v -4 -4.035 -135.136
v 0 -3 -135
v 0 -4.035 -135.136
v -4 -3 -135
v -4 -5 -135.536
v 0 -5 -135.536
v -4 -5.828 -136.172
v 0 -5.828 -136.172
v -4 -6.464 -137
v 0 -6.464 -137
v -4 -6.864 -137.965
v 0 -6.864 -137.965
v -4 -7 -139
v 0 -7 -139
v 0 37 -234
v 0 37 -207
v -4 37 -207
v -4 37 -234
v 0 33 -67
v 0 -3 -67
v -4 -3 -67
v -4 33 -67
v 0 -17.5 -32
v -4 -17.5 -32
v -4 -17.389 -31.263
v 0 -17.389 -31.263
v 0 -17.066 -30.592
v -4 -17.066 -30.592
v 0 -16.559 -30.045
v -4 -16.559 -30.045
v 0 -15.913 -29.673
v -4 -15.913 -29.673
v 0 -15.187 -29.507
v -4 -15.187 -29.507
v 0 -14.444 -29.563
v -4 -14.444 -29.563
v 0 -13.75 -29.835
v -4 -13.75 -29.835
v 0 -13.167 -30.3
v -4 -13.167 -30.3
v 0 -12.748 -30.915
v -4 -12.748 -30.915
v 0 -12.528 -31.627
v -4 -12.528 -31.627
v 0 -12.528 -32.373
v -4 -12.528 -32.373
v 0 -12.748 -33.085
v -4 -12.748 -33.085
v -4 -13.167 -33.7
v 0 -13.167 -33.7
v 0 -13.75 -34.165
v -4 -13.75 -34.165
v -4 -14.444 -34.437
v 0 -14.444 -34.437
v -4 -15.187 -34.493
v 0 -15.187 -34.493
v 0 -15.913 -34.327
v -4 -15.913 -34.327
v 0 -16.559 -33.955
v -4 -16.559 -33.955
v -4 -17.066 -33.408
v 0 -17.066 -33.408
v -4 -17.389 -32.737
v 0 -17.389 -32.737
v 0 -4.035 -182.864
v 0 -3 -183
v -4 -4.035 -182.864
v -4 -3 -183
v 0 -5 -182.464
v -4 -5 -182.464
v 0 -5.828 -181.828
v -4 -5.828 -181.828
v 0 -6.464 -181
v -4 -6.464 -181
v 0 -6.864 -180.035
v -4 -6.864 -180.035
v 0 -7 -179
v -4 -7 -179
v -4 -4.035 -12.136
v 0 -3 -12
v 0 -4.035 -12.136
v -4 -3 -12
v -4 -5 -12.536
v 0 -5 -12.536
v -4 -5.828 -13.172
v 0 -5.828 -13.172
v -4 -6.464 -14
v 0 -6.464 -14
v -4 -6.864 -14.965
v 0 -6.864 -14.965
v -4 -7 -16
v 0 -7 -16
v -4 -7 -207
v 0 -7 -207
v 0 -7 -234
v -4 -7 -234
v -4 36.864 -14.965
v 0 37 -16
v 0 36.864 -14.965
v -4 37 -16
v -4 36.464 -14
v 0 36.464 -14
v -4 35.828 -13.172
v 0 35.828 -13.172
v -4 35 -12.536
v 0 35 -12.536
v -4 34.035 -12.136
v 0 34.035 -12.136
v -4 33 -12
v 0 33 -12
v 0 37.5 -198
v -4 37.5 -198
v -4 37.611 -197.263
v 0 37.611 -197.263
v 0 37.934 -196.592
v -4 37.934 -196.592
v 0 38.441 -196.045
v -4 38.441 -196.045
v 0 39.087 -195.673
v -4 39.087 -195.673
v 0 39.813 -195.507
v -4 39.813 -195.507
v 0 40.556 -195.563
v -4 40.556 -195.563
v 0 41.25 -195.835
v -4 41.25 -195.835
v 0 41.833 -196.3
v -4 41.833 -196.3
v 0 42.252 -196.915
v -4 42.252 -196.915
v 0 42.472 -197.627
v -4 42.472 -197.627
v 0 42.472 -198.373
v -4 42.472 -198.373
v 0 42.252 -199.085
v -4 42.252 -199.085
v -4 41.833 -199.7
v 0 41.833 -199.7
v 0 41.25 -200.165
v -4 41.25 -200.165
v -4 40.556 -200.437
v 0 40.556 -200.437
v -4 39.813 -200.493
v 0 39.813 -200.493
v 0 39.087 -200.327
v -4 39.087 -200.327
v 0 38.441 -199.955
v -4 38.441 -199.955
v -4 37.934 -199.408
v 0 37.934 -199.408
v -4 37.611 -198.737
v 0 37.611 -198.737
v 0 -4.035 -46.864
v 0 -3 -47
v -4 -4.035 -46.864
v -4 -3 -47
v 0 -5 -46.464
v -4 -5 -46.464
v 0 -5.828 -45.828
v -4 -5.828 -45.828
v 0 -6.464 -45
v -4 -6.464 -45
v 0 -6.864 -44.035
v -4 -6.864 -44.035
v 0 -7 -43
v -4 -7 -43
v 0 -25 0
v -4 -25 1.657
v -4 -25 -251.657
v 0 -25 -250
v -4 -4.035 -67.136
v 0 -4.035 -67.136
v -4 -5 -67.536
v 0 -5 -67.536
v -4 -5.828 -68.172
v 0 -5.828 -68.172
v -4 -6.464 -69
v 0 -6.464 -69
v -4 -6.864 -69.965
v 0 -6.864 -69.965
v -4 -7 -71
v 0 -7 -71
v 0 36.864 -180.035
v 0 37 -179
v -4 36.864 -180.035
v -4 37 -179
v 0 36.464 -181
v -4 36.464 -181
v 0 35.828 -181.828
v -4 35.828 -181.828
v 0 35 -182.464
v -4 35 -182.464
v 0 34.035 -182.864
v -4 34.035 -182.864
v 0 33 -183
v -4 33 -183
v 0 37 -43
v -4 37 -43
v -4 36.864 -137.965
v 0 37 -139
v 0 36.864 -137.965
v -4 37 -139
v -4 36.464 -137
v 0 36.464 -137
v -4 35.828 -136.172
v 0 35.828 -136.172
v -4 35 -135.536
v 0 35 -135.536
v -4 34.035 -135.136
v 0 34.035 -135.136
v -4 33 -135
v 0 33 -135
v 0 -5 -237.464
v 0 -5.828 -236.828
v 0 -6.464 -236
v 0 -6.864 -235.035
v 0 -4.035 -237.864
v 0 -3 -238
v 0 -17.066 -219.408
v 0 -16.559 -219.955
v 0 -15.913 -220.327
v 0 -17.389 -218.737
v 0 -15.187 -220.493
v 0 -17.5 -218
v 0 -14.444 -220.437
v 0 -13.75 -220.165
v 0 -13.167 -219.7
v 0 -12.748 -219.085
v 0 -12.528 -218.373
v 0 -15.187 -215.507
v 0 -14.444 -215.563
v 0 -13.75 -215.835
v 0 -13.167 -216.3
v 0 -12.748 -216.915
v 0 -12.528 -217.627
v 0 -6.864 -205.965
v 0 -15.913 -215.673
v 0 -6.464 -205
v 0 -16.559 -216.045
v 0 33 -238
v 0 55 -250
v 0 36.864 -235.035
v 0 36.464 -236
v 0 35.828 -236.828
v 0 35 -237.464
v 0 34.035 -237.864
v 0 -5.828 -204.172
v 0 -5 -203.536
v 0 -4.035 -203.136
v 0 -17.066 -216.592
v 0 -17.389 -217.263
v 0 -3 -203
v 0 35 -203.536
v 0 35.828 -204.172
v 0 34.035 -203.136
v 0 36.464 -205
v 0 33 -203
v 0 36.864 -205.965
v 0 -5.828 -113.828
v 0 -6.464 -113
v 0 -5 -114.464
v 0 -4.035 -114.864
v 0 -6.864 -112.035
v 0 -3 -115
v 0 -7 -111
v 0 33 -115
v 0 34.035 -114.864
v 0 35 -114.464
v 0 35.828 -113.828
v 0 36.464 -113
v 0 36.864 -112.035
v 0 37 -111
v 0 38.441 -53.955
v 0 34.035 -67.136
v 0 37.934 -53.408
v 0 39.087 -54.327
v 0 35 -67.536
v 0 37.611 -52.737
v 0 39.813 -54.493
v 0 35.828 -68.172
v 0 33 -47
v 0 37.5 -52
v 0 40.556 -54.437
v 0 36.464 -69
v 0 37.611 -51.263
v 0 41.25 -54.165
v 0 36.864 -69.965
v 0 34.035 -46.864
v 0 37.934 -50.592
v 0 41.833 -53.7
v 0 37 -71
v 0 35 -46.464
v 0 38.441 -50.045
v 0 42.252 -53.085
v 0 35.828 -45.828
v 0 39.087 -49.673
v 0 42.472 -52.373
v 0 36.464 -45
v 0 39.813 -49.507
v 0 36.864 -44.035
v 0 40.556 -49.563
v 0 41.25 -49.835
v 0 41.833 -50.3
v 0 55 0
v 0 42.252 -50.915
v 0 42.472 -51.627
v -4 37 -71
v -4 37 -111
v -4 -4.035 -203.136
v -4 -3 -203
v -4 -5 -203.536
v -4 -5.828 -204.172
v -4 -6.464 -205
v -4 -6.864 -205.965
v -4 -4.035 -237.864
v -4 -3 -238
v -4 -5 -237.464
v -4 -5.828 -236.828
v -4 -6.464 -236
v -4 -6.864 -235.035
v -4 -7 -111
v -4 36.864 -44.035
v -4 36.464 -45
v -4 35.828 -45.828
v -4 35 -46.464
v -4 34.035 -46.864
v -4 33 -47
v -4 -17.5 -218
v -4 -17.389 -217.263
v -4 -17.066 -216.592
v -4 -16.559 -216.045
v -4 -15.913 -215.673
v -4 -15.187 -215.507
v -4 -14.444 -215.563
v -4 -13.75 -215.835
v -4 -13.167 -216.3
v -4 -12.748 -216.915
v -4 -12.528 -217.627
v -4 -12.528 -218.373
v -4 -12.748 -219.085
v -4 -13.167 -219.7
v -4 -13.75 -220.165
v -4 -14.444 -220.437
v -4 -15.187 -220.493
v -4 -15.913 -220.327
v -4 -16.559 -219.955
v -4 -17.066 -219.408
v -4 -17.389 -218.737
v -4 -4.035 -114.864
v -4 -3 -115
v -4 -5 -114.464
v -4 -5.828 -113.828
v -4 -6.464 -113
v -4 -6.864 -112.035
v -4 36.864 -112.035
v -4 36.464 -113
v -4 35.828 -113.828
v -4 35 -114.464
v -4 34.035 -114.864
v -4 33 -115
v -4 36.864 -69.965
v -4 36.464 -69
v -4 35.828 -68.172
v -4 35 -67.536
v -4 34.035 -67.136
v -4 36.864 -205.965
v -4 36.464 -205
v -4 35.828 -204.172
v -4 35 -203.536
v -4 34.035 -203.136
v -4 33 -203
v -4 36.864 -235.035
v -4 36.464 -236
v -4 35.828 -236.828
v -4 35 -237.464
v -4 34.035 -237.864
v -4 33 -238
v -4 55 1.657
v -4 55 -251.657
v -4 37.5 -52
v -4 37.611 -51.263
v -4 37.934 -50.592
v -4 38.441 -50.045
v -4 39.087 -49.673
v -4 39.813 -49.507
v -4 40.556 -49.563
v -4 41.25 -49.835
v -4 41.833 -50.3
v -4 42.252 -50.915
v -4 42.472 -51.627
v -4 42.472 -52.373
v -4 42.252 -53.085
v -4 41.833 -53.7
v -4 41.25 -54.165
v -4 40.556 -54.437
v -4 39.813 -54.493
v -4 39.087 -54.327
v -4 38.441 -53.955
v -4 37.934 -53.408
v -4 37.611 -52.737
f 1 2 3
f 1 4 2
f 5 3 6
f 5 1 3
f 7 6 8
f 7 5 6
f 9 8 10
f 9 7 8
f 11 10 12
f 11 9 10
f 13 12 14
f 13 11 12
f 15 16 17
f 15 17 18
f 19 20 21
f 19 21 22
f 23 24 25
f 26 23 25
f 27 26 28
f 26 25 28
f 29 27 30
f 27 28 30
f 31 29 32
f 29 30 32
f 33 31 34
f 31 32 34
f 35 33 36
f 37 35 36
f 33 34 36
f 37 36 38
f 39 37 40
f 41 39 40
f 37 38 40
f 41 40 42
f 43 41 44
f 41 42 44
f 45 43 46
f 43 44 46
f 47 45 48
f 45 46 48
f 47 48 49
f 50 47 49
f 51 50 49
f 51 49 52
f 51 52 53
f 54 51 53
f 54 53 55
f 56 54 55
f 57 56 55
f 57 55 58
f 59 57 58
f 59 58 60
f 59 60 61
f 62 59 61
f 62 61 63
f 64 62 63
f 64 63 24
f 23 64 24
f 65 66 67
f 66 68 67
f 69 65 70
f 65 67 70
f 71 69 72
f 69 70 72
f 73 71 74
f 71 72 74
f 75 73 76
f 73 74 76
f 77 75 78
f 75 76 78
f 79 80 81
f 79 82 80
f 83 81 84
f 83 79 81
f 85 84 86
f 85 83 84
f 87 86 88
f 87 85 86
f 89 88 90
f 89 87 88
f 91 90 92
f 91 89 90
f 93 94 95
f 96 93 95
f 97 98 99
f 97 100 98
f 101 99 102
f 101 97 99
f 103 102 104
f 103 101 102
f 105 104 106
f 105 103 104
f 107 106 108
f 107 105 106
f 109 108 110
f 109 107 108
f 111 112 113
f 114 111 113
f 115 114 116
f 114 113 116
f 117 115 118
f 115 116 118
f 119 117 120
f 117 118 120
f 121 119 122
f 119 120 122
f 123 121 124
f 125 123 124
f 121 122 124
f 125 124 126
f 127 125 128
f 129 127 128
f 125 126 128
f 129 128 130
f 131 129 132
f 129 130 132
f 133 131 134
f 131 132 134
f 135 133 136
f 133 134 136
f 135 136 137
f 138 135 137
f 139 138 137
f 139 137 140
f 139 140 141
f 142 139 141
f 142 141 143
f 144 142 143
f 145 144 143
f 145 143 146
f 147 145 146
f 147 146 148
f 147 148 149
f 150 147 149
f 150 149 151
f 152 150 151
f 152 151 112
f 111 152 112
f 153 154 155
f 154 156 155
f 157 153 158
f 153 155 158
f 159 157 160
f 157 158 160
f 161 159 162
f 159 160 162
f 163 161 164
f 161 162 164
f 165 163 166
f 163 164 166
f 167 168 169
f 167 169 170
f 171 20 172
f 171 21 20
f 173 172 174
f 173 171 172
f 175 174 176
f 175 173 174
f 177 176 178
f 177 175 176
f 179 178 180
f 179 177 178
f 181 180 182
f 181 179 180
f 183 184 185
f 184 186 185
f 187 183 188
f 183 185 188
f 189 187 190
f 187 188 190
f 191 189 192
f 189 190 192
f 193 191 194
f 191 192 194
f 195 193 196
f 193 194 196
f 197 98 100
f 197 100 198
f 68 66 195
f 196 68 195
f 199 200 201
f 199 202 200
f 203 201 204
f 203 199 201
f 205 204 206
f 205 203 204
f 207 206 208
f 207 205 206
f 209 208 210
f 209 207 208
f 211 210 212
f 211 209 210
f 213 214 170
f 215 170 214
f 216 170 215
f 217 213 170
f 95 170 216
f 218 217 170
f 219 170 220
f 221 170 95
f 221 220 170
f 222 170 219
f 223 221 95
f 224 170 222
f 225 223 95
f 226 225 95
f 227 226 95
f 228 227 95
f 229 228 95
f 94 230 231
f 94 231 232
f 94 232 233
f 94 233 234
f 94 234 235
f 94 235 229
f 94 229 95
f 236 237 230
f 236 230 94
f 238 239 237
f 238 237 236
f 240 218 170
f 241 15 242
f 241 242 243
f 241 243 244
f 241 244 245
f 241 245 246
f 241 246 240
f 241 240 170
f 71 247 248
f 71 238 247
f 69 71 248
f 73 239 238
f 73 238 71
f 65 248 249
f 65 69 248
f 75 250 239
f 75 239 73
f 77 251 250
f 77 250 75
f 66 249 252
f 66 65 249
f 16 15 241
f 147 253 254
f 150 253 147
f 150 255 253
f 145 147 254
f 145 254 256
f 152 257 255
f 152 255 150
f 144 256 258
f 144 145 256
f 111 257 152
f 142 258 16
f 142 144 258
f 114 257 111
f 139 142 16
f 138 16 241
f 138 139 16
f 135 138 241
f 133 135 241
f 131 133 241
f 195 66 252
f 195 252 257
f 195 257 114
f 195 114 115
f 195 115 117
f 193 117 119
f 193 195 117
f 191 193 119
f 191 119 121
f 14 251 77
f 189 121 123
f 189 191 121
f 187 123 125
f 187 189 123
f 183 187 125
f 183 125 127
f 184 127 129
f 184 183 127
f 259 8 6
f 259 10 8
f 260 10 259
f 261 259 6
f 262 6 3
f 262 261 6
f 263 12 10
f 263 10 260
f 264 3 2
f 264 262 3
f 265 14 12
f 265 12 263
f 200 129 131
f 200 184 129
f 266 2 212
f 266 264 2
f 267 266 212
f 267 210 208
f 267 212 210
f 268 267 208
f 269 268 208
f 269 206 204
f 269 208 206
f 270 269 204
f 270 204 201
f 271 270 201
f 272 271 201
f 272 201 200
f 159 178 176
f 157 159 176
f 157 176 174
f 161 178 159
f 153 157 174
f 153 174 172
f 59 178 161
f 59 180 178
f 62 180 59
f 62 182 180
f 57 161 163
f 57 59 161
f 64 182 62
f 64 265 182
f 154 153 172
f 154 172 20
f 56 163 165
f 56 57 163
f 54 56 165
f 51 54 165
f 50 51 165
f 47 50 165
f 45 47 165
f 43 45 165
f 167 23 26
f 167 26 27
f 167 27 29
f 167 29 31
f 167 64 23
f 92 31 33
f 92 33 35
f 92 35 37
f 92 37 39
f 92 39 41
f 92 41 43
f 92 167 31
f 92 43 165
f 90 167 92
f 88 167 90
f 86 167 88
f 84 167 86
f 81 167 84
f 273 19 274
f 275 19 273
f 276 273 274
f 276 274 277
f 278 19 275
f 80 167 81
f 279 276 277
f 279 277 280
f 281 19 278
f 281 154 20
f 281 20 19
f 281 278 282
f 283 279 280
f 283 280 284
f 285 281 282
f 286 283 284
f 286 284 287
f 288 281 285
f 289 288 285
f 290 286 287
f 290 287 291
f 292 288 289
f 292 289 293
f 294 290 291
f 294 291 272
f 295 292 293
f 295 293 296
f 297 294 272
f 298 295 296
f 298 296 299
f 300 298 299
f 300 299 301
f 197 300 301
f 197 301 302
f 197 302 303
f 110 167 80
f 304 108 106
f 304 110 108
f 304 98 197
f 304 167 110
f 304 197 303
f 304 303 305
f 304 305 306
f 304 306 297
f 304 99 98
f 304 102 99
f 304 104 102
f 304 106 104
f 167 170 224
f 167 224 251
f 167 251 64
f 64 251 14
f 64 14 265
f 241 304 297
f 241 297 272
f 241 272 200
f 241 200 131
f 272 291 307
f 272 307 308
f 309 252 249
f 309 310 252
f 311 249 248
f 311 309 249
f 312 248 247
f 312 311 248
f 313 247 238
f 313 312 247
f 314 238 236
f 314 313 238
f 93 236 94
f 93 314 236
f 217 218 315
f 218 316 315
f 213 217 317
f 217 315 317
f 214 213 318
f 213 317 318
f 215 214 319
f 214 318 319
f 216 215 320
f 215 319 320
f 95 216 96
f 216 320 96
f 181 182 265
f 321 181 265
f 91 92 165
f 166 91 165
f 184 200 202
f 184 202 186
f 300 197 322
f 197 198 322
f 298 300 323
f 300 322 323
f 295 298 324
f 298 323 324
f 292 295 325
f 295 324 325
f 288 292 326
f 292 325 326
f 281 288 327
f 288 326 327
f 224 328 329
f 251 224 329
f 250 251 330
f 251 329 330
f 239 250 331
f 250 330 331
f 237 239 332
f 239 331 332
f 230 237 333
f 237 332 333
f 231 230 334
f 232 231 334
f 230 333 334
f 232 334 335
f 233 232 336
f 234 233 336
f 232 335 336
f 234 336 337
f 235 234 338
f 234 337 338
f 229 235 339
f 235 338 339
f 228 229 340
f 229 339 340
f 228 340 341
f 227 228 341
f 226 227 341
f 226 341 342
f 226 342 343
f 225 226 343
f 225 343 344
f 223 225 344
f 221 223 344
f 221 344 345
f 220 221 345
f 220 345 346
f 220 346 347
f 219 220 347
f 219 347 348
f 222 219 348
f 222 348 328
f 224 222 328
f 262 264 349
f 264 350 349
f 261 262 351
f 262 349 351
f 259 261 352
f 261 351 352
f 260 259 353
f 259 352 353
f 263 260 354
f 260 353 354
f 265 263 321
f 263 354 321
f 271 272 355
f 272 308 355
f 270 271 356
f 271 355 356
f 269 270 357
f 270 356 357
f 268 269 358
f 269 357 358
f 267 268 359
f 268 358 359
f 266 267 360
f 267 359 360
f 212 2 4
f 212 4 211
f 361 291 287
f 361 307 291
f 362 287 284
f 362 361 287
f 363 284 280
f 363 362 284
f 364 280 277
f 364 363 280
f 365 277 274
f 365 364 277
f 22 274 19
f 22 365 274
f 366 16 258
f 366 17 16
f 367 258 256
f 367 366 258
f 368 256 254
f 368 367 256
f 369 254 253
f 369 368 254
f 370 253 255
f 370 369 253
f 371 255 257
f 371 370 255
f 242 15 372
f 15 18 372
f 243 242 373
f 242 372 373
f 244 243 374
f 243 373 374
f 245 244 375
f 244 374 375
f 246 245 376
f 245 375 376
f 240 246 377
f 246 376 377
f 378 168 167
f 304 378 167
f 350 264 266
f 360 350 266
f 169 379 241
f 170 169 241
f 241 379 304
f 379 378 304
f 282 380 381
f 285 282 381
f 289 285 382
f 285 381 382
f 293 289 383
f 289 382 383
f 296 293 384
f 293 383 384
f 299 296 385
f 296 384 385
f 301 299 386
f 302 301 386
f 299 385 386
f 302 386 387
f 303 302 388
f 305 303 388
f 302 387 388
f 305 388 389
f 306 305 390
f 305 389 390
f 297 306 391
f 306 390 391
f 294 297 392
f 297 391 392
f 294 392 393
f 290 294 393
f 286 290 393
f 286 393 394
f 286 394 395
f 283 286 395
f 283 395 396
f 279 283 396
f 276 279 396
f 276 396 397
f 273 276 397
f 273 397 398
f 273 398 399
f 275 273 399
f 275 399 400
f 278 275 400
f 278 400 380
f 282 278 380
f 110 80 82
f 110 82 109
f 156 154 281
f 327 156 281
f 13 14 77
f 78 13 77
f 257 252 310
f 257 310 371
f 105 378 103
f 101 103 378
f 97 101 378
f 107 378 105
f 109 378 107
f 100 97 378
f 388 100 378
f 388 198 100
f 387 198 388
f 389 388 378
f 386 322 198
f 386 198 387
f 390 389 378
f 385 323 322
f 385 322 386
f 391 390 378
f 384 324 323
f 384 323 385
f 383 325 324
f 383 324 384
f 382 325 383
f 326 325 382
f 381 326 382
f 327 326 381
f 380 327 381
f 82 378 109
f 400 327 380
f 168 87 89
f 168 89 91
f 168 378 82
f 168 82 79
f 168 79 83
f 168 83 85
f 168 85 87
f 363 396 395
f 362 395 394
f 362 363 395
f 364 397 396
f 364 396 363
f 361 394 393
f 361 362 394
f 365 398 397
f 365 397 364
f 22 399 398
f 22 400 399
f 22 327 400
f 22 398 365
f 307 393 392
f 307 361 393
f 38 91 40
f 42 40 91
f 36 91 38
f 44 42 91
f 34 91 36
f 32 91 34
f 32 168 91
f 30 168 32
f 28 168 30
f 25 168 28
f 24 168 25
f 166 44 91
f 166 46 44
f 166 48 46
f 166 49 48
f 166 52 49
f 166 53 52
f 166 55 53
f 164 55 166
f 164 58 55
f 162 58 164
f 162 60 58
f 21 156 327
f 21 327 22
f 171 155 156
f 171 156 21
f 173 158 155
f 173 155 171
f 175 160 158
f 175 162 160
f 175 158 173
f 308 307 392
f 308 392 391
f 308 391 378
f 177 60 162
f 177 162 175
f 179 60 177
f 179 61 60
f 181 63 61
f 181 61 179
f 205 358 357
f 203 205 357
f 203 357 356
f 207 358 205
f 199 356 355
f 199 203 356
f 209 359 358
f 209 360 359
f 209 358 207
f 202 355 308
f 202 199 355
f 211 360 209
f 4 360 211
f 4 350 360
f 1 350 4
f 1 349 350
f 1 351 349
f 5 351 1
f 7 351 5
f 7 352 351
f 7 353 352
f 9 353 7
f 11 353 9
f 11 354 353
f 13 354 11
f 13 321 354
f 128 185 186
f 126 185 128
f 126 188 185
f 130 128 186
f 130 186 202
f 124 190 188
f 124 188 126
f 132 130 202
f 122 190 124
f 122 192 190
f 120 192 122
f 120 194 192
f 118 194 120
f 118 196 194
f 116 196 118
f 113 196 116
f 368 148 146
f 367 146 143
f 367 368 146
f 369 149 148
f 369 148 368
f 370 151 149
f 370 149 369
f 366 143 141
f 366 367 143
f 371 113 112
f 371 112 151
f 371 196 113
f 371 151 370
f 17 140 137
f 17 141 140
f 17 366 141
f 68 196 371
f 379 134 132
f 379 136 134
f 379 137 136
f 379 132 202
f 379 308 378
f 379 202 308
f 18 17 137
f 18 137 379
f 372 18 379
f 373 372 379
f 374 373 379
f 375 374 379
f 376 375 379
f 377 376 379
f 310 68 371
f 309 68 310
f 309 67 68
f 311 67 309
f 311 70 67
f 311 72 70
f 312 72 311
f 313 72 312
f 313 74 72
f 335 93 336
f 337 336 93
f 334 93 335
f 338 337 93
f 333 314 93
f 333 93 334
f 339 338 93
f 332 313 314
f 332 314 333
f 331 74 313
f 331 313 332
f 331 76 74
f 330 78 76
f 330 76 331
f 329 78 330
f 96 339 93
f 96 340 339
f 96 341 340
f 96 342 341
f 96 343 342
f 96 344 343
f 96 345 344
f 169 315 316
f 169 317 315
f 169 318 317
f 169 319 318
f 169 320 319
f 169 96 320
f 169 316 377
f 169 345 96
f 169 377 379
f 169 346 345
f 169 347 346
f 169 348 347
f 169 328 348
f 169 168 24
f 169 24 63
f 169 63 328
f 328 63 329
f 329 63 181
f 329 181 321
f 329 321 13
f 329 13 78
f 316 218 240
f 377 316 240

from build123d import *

# Parameters (mm, degrees)
SKETCH_1_W          = 4
SKETCH_1_H          = 80
EXTRUDE_3_DEPTH     = 250
EXTRUDE_4_DEPTH     = 80
EXTRUDE_5_DEPTH     = 80
SKETCH_8_W          = 35
SKETCH_8_H          = 44
SKETCH_8_W_2        = 48
CUT_EXTRUDE_1_DEPTH = 258.627972648
SKETCH_2_R          = 2.5
CUT_EXTRUDE_2_DEPTH = 258.627972648
FILLET_1_R          = 4
FILLET_2_R          = 4
FILLET_3_R          = 4
FILLET_4_R          = 4


with BuildPart() as part:
    # 草图1 → 拉伸3 (new body)
    with BuildSketch(Plane.XY):
        with Locations((-2, 15)):
            Rectangle(SKETCH_1_W, SKETCH_1_H)
    extrude(amount=-EXTRUDE_3_DEPTH)

    # 草图4 → 拉伸4 (add)
    with BuildSketch(Plane.XZ.offset(25)):
        Polygon((-4, 0), (-4, 1.656854249), (0, 0), align=None)
    extrude(amount=-EXTRUDE_4_DEPTH)

    # 草图6 → 拉伸5 (add)
    with BuildSketch(Plane.XZ.offset(25)):
        Polygon((-4, -250), (-4, -251.656854249), (0, -250), align=None)
    extrude(amount=-EXTRUDE_5_DEPTH)

    # 草图8 → 切除-拉伸1 (cut, through all)
    with BuildSketch(Plane(origin=(0, 0, 0), x_dir=(0, 0, -1), z_dir=(1, 0, 0))):
        with Locations((29.5, 15)):
            Rectangle(SKETCH_8_W, SKETCH_8_H)
        with Locations((91, 15)):
            Rectangle(SKETCH_8_W_2, SKETCH_8_H)
        with Locations((159, 15)):
            Rectangle(SKETCH_8_W_2, SKETCH_8_H)
        with Locations((220.5, 15)):
            Rectangle(SKETCH_8_W, SKETCH_8_H)
    extrude(amount=-CUT_EXTRUDE_1_DEPTH, mode=Mode.SUBTRACT)

    # 草图2 → 切除-拉伸2 (cut, through all)
    with BuildSketch(Plane.ZY.offset(4)):
        with Locations(Location((-198, 40, 0), (0, 0, 270))):
            Circle(SKETCH_2_R)
        with Locations(Location((-218, -15, 0), (0, 0, 270))):
            Circle(SKETCH_2_R)
        with Locations(Location((-52, 40, 0), (0, 0, 270))):
            Circle(SKETCH_2_R)
        with Locations(Location((-32, -15, 0), (0, 0, 270))):
            Circle(SKETCH_2_R)
    extrude(amount=-CUT_EXTRUDE_2_DEPTH, mode=Mode.SUBTRACT)

    # 圆角1
    fillet_1_edges = [part.edges().sort_by_distance(p)[0] for p in [
        (-2, -7, -12),
        (-2, 37, -12),
        (-2, 37, -47),
        (-2, -7, -47),
    ]]
    fillet(fillet_1_edges, radius=FILLET_1_R)

    # 圆角2
    fillet_2_edges = [part.edges().sort_by_distance(p)[0] for p in [
        (-2, -7, -67),
        (-2, 37, -67),
        (-2, 37, -115),
        (-2, -7, -115),
    ]]
    fillet(fillet_2_edges, radius=FILLET_2_R)

    # 圆角3
    fillet_3_edges = [part.edges().sort_by_distance(p)[0] for p in [
        (-2, -7, -135),
        (-2, 37, -135),
        (-2, 37, -183),
        (-2, -7, -183),
    ]]
    fillet(fillet_3_edges, radius=FILLET_3_R)

    # 圆角4
    fillet_4_edges = [part.edges().sort_by_distance(p)[0] for p in [
        (-2, -7, -203),
        (-2, 37, -203),
        (-2, 37, -238),
        (-2, -7, -238),
    ]]
    fillet(fillet_4_edges, radius=FILLET_4_R)


solid = part.part
